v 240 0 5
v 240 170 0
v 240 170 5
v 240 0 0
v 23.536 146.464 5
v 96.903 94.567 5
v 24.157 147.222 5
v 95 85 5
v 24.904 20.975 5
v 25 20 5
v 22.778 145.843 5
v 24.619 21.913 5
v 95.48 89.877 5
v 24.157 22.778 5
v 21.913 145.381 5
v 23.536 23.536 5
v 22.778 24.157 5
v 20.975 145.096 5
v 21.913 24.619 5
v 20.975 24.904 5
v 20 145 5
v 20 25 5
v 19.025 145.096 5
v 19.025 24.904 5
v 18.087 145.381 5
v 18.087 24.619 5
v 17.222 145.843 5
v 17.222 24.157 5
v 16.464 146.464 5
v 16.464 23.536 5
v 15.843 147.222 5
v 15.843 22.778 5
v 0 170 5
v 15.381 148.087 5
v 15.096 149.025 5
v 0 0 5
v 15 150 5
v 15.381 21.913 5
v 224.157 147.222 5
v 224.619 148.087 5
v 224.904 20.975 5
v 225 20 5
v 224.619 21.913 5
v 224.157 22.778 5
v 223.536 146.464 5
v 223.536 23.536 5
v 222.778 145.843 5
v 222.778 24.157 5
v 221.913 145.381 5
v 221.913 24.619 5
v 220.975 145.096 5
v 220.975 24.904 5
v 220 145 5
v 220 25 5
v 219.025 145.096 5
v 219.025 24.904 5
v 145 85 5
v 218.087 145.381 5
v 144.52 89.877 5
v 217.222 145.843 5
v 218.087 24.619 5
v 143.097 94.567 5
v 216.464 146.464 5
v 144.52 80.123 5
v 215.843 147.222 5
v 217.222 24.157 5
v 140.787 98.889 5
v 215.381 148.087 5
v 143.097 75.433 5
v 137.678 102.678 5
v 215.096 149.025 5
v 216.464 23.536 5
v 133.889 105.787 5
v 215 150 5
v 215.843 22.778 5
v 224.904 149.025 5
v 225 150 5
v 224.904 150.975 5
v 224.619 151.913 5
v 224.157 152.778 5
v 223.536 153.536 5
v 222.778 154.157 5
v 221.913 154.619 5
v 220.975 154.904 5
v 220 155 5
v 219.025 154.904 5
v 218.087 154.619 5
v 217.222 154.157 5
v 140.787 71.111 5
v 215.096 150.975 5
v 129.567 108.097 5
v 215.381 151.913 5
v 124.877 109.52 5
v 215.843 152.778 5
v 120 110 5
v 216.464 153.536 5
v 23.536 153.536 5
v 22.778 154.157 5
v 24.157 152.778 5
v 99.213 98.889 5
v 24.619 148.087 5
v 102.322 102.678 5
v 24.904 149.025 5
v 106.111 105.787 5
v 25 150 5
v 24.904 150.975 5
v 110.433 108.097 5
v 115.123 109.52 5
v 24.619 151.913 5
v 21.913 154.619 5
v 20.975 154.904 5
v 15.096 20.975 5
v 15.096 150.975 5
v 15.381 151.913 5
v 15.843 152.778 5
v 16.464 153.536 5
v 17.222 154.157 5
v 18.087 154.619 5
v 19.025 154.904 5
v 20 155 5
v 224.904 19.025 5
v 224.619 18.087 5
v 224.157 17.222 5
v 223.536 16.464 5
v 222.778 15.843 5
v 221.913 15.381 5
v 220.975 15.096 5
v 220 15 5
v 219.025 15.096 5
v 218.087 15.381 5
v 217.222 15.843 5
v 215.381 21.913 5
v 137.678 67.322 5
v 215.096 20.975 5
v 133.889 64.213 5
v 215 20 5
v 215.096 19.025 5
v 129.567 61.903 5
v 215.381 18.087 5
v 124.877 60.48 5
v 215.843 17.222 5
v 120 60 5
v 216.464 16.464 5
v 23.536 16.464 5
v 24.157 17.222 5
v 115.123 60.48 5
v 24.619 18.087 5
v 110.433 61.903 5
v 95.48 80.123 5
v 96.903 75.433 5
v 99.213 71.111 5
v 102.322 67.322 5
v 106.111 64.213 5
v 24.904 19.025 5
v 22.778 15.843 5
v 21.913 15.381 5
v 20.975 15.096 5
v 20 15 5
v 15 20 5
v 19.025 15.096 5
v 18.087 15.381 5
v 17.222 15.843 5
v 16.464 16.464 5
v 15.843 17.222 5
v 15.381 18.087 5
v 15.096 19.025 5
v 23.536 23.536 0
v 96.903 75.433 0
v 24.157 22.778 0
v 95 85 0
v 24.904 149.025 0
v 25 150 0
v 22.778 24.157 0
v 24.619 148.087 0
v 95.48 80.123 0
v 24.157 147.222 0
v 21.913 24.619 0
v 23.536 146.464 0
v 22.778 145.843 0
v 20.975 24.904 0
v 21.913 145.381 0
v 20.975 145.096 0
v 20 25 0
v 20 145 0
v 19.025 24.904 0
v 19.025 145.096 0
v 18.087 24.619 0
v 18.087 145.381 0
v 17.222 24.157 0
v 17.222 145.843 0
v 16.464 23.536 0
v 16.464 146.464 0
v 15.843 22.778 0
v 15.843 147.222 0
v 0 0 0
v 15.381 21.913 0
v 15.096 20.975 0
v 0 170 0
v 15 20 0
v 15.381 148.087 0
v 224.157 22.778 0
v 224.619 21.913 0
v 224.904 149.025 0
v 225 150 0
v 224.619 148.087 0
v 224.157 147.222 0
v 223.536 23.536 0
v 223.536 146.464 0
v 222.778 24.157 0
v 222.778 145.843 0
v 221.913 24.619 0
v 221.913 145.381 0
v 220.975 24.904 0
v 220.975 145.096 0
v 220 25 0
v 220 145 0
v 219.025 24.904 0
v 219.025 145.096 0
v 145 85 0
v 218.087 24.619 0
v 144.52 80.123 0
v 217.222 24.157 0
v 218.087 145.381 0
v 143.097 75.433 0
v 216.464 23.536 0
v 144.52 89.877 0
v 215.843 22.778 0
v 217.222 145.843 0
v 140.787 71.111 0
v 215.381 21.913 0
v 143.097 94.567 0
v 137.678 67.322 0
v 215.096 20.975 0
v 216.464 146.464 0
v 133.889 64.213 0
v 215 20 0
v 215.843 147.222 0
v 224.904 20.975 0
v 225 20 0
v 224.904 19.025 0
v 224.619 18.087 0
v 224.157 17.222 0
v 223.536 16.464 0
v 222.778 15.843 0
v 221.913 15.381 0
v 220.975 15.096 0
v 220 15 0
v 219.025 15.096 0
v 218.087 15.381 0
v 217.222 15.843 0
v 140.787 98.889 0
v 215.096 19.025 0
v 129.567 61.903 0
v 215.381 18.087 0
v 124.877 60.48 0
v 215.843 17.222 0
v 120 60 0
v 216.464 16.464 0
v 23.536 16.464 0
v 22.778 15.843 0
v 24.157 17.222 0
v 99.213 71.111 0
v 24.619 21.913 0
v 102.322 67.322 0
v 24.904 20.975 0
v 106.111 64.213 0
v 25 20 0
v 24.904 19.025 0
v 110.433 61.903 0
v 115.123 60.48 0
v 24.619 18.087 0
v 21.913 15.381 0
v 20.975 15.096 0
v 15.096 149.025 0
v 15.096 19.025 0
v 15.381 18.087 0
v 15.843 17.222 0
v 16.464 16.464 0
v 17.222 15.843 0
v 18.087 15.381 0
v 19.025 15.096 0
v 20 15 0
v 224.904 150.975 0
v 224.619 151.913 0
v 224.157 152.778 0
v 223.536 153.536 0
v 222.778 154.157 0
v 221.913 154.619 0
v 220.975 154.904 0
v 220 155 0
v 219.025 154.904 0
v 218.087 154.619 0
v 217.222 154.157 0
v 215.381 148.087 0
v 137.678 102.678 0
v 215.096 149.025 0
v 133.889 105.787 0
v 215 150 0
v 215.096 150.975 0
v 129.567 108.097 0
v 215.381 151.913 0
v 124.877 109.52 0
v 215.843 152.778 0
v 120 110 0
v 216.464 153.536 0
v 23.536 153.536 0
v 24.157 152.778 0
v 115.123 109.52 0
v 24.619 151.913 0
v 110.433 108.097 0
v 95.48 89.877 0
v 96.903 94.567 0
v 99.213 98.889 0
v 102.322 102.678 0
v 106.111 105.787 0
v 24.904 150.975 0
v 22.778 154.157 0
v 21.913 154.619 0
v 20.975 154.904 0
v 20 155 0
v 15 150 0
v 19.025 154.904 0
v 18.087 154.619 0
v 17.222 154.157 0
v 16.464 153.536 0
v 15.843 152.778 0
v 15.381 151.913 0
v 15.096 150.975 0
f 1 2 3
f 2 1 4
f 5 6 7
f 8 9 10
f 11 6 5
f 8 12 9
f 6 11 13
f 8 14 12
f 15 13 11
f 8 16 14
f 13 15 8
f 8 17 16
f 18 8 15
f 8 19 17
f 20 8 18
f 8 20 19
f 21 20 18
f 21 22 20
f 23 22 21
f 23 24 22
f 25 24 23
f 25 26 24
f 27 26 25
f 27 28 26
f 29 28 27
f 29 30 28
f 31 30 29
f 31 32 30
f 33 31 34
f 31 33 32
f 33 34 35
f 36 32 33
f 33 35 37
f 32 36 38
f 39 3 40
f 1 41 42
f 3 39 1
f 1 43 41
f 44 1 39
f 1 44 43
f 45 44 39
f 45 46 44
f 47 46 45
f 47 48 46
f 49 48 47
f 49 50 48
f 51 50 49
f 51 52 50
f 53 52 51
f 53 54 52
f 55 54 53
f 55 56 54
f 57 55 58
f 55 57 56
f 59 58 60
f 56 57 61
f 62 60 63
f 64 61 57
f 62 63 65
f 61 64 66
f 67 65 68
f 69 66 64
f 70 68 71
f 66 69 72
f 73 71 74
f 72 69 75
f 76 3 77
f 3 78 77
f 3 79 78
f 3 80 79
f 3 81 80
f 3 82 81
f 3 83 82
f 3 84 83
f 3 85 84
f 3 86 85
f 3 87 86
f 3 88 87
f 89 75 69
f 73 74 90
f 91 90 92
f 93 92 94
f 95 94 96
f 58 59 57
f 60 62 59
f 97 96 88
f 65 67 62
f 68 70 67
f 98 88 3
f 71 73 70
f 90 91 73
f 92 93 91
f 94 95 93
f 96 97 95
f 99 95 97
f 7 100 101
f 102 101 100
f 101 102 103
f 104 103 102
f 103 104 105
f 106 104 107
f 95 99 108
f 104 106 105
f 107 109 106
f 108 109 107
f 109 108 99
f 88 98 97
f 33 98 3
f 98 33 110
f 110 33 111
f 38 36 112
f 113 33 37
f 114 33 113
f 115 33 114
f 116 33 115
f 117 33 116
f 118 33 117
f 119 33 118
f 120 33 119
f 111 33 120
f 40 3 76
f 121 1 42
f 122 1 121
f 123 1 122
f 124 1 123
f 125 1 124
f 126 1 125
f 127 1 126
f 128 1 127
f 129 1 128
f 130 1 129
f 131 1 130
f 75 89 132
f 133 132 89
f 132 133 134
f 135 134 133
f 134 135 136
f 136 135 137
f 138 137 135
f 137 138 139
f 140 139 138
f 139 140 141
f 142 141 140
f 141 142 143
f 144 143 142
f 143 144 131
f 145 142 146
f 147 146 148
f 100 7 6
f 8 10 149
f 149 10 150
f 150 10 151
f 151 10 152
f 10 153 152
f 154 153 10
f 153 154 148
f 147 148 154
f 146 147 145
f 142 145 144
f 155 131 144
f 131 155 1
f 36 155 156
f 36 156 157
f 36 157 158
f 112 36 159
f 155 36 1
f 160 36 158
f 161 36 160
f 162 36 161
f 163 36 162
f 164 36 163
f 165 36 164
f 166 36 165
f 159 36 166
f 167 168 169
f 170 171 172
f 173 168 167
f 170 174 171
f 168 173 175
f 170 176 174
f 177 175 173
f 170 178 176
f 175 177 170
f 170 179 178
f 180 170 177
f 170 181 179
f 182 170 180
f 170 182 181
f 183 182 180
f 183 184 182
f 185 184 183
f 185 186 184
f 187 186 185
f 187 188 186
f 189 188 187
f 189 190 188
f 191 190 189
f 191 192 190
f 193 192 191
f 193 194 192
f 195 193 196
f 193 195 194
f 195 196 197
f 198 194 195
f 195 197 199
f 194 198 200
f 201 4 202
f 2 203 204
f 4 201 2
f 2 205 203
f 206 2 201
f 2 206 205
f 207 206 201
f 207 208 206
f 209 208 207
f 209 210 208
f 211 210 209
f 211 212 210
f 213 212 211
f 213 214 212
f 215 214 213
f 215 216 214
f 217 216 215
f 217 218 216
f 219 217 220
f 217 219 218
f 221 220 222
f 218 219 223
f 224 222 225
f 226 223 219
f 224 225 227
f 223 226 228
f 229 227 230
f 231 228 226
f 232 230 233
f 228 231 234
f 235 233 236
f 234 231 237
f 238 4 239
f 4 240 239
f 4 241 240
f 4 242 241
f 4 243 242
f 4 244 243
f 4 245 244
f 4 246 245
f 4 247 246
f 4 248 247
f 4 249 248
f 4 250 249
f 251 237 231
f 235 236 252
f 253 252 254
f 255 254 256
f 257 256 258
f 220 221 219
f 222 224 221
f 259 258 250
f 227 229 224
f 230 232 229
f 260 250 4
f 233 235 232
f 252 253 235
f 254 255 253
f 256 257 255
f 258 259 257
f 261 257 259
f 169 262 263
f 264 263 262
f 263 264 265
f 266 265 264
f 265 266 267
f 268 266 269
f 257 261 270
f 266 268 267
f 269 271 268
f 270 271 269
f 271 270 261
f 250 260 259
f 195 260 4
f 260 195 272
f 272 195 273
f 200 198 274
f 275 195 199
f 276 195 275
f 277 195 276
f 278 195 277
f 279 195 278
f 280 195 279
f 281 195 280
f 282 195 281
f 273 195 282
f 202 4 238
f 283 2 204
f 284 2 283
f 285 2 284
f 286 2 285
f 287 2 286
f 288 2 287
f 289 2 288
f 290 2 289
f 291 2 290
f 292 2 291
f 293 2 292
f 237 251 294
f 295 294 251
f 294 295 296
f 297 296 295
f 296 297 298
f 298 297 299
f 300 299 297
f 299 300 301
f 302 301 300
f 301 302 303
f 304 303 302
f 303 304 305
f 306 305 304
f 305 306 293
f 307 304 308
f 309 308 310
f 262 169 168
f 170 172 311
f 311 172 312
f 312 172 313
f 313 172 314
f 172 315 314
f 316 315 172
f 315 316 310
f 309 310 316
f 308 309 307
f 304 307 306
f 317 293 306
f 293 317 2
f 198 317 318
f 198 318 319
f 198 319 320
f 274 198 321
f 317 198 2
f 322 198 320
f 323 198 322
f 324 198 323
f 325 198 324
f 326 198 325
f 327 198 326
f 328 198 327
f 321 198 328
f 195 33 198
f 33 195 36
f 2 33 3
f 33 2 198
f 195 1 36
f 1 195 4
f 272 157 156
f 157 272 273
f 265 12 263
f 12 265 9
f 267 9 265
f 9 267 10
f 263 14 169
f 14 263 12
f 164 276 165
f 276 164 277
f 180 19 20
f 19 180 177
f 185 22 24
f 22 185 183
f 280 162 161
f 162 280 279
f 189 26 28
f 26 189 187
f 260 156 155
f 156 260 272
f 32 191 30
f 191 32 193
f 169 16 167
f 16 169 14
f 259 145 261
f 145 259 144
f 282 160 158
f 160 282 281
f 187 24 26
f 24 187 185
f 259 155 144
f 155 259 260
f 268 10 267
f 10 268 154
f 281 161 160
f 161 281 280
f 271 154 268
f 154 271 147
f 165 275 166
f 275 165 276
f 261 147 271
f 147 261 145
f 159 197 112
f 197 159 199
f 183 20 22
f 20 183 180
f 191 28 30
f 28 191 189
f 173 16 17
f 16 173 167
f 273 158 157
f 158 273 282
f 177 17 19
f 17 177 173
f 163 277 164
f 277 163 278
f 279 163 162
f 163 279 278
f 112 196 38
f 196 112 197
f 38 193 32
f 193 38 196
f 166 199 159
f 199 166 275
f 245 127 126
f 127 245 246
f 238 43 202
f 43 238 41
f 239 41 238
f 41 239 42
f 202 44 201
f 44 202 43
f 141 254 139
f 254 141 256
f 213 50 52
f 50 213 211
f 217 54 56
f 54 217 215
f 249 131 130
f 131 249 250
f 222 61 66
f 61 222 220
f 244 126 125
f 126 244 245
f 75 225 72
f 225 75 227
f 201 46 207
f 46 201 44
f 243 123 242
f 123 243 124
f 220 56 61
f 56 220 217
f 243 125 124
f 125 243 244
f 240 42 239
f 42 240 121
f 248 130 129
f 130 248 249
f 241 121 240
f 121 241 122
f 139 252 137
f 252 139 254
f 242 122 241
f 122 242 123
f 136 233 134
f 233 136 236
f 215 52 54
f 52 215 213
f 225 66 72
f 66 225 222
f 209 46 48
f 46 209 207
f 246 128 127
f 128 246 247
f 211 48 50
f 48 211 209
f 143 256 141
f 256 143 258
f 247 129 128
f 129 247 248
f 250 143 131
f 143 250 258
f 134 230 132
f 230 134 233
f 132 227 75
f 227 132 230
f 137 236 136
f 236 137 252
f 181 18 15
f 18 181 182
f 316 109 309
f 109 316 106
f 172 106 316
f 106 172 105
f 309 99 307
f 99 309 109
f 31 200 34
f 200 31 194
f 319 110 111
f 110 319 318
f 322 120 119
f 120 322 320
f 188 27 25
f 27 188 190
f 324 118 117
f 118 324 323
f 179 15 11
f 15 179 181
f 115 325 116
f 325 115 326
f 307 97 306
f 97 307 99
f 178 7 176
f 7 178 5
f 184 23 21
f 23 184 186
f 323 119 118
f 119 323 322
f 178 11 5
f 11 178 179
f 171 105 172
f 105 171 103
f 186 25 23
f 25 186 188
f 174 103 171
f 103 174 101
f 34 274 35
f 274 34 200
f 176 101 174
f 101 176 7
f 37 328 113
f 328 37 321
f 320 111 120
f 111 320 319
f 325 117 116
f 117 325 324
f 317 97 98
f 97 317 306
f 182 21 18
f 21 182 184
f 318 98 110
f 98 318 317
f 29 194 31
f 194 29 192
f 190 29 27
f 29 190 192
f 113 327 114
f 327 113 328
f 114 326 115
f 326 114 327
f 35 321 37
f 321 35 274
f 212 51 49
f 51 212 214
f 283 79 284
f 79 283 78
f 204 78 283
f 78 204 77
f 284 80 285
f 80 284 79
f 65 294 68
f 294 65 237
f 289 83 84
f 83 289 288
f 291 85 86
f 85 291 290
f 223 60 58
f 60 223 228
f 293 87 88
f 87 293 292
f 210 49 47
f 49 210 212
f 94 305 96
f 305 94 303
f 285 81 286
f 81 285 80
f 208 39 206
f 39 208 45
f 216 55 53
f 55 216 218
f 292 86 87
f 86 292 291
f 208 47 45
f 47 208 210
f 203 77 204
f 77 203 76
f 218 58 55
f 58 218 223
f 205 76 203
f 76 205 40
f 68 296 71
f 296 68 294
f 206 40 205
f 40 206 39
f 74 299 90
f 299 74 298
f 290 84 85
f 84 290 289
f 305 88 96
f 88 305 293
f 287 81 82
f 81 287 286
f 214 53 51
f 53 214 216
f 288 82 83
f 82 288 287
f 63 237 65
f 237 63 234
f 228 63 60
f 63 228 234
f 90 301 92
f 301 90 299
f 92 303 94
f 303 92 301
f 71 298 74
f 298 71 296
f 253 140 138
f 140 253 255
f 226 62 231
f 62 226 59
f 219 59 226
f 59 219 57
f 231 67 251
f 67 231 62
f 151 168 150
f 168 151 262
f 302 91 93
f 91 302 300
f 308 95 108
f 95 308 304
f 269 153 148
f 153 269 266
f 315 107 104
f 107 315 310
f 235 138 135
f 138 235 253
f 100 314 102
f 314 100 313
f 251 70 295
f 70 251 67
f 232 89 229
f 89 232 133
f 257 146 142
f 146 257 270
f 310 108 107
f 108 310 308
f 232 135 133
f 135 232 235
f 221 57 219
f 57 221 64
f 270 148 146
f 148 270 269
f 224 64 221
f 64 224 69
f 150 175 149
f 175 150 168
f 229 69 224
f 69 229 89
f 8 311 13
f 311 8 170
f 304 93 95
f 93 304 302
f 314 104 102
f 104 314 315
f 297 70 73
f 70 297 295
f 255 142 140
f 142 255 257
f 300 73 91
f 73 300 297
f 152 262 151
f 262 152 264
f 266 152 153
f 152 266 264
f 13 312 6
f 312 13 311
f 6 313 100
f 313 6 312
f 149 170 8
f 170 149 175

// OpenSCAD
$fn = 32;

// ----------------------------------------------------------------------
// Big plate: 200-250 mm adapter plate
// ----------------------------------------------------------------------

// --- parameters (mm) ---
plate_l = 240;            // plate length, X
plate_w = 170;            // plate width, Y
plate_t = 5;              // plate thickness, Z
corner_d = 10;            // corner hole diameter
corner_in = 20;           // corner hole inset from the edges
bore_d = 50;              // central bore

difference() {
  cube([plate_l, plate_w, plate_t]);
  translate([corner_in, corner_in, -1]) cylinder(h = plate_t + 2, d = corner_d);
  translate([plate_l - corner_in, corner_in, -1]) cylinder(h = plate_t + 2, d = corner_d);
  translate([corner_in, plate_w - corner_in, -1]) cylinder(h = plate_t + 2, d = corner_d);
  translate([plate_l - corner_in, plate_w - corner_in, -1]) cylinder(h = plate_t + 2, d = corner_d);
  translate([plate_l / 2, plate_w / 2, -1]) cylinder(h = plate_t + 2, d = bore_d);
}
